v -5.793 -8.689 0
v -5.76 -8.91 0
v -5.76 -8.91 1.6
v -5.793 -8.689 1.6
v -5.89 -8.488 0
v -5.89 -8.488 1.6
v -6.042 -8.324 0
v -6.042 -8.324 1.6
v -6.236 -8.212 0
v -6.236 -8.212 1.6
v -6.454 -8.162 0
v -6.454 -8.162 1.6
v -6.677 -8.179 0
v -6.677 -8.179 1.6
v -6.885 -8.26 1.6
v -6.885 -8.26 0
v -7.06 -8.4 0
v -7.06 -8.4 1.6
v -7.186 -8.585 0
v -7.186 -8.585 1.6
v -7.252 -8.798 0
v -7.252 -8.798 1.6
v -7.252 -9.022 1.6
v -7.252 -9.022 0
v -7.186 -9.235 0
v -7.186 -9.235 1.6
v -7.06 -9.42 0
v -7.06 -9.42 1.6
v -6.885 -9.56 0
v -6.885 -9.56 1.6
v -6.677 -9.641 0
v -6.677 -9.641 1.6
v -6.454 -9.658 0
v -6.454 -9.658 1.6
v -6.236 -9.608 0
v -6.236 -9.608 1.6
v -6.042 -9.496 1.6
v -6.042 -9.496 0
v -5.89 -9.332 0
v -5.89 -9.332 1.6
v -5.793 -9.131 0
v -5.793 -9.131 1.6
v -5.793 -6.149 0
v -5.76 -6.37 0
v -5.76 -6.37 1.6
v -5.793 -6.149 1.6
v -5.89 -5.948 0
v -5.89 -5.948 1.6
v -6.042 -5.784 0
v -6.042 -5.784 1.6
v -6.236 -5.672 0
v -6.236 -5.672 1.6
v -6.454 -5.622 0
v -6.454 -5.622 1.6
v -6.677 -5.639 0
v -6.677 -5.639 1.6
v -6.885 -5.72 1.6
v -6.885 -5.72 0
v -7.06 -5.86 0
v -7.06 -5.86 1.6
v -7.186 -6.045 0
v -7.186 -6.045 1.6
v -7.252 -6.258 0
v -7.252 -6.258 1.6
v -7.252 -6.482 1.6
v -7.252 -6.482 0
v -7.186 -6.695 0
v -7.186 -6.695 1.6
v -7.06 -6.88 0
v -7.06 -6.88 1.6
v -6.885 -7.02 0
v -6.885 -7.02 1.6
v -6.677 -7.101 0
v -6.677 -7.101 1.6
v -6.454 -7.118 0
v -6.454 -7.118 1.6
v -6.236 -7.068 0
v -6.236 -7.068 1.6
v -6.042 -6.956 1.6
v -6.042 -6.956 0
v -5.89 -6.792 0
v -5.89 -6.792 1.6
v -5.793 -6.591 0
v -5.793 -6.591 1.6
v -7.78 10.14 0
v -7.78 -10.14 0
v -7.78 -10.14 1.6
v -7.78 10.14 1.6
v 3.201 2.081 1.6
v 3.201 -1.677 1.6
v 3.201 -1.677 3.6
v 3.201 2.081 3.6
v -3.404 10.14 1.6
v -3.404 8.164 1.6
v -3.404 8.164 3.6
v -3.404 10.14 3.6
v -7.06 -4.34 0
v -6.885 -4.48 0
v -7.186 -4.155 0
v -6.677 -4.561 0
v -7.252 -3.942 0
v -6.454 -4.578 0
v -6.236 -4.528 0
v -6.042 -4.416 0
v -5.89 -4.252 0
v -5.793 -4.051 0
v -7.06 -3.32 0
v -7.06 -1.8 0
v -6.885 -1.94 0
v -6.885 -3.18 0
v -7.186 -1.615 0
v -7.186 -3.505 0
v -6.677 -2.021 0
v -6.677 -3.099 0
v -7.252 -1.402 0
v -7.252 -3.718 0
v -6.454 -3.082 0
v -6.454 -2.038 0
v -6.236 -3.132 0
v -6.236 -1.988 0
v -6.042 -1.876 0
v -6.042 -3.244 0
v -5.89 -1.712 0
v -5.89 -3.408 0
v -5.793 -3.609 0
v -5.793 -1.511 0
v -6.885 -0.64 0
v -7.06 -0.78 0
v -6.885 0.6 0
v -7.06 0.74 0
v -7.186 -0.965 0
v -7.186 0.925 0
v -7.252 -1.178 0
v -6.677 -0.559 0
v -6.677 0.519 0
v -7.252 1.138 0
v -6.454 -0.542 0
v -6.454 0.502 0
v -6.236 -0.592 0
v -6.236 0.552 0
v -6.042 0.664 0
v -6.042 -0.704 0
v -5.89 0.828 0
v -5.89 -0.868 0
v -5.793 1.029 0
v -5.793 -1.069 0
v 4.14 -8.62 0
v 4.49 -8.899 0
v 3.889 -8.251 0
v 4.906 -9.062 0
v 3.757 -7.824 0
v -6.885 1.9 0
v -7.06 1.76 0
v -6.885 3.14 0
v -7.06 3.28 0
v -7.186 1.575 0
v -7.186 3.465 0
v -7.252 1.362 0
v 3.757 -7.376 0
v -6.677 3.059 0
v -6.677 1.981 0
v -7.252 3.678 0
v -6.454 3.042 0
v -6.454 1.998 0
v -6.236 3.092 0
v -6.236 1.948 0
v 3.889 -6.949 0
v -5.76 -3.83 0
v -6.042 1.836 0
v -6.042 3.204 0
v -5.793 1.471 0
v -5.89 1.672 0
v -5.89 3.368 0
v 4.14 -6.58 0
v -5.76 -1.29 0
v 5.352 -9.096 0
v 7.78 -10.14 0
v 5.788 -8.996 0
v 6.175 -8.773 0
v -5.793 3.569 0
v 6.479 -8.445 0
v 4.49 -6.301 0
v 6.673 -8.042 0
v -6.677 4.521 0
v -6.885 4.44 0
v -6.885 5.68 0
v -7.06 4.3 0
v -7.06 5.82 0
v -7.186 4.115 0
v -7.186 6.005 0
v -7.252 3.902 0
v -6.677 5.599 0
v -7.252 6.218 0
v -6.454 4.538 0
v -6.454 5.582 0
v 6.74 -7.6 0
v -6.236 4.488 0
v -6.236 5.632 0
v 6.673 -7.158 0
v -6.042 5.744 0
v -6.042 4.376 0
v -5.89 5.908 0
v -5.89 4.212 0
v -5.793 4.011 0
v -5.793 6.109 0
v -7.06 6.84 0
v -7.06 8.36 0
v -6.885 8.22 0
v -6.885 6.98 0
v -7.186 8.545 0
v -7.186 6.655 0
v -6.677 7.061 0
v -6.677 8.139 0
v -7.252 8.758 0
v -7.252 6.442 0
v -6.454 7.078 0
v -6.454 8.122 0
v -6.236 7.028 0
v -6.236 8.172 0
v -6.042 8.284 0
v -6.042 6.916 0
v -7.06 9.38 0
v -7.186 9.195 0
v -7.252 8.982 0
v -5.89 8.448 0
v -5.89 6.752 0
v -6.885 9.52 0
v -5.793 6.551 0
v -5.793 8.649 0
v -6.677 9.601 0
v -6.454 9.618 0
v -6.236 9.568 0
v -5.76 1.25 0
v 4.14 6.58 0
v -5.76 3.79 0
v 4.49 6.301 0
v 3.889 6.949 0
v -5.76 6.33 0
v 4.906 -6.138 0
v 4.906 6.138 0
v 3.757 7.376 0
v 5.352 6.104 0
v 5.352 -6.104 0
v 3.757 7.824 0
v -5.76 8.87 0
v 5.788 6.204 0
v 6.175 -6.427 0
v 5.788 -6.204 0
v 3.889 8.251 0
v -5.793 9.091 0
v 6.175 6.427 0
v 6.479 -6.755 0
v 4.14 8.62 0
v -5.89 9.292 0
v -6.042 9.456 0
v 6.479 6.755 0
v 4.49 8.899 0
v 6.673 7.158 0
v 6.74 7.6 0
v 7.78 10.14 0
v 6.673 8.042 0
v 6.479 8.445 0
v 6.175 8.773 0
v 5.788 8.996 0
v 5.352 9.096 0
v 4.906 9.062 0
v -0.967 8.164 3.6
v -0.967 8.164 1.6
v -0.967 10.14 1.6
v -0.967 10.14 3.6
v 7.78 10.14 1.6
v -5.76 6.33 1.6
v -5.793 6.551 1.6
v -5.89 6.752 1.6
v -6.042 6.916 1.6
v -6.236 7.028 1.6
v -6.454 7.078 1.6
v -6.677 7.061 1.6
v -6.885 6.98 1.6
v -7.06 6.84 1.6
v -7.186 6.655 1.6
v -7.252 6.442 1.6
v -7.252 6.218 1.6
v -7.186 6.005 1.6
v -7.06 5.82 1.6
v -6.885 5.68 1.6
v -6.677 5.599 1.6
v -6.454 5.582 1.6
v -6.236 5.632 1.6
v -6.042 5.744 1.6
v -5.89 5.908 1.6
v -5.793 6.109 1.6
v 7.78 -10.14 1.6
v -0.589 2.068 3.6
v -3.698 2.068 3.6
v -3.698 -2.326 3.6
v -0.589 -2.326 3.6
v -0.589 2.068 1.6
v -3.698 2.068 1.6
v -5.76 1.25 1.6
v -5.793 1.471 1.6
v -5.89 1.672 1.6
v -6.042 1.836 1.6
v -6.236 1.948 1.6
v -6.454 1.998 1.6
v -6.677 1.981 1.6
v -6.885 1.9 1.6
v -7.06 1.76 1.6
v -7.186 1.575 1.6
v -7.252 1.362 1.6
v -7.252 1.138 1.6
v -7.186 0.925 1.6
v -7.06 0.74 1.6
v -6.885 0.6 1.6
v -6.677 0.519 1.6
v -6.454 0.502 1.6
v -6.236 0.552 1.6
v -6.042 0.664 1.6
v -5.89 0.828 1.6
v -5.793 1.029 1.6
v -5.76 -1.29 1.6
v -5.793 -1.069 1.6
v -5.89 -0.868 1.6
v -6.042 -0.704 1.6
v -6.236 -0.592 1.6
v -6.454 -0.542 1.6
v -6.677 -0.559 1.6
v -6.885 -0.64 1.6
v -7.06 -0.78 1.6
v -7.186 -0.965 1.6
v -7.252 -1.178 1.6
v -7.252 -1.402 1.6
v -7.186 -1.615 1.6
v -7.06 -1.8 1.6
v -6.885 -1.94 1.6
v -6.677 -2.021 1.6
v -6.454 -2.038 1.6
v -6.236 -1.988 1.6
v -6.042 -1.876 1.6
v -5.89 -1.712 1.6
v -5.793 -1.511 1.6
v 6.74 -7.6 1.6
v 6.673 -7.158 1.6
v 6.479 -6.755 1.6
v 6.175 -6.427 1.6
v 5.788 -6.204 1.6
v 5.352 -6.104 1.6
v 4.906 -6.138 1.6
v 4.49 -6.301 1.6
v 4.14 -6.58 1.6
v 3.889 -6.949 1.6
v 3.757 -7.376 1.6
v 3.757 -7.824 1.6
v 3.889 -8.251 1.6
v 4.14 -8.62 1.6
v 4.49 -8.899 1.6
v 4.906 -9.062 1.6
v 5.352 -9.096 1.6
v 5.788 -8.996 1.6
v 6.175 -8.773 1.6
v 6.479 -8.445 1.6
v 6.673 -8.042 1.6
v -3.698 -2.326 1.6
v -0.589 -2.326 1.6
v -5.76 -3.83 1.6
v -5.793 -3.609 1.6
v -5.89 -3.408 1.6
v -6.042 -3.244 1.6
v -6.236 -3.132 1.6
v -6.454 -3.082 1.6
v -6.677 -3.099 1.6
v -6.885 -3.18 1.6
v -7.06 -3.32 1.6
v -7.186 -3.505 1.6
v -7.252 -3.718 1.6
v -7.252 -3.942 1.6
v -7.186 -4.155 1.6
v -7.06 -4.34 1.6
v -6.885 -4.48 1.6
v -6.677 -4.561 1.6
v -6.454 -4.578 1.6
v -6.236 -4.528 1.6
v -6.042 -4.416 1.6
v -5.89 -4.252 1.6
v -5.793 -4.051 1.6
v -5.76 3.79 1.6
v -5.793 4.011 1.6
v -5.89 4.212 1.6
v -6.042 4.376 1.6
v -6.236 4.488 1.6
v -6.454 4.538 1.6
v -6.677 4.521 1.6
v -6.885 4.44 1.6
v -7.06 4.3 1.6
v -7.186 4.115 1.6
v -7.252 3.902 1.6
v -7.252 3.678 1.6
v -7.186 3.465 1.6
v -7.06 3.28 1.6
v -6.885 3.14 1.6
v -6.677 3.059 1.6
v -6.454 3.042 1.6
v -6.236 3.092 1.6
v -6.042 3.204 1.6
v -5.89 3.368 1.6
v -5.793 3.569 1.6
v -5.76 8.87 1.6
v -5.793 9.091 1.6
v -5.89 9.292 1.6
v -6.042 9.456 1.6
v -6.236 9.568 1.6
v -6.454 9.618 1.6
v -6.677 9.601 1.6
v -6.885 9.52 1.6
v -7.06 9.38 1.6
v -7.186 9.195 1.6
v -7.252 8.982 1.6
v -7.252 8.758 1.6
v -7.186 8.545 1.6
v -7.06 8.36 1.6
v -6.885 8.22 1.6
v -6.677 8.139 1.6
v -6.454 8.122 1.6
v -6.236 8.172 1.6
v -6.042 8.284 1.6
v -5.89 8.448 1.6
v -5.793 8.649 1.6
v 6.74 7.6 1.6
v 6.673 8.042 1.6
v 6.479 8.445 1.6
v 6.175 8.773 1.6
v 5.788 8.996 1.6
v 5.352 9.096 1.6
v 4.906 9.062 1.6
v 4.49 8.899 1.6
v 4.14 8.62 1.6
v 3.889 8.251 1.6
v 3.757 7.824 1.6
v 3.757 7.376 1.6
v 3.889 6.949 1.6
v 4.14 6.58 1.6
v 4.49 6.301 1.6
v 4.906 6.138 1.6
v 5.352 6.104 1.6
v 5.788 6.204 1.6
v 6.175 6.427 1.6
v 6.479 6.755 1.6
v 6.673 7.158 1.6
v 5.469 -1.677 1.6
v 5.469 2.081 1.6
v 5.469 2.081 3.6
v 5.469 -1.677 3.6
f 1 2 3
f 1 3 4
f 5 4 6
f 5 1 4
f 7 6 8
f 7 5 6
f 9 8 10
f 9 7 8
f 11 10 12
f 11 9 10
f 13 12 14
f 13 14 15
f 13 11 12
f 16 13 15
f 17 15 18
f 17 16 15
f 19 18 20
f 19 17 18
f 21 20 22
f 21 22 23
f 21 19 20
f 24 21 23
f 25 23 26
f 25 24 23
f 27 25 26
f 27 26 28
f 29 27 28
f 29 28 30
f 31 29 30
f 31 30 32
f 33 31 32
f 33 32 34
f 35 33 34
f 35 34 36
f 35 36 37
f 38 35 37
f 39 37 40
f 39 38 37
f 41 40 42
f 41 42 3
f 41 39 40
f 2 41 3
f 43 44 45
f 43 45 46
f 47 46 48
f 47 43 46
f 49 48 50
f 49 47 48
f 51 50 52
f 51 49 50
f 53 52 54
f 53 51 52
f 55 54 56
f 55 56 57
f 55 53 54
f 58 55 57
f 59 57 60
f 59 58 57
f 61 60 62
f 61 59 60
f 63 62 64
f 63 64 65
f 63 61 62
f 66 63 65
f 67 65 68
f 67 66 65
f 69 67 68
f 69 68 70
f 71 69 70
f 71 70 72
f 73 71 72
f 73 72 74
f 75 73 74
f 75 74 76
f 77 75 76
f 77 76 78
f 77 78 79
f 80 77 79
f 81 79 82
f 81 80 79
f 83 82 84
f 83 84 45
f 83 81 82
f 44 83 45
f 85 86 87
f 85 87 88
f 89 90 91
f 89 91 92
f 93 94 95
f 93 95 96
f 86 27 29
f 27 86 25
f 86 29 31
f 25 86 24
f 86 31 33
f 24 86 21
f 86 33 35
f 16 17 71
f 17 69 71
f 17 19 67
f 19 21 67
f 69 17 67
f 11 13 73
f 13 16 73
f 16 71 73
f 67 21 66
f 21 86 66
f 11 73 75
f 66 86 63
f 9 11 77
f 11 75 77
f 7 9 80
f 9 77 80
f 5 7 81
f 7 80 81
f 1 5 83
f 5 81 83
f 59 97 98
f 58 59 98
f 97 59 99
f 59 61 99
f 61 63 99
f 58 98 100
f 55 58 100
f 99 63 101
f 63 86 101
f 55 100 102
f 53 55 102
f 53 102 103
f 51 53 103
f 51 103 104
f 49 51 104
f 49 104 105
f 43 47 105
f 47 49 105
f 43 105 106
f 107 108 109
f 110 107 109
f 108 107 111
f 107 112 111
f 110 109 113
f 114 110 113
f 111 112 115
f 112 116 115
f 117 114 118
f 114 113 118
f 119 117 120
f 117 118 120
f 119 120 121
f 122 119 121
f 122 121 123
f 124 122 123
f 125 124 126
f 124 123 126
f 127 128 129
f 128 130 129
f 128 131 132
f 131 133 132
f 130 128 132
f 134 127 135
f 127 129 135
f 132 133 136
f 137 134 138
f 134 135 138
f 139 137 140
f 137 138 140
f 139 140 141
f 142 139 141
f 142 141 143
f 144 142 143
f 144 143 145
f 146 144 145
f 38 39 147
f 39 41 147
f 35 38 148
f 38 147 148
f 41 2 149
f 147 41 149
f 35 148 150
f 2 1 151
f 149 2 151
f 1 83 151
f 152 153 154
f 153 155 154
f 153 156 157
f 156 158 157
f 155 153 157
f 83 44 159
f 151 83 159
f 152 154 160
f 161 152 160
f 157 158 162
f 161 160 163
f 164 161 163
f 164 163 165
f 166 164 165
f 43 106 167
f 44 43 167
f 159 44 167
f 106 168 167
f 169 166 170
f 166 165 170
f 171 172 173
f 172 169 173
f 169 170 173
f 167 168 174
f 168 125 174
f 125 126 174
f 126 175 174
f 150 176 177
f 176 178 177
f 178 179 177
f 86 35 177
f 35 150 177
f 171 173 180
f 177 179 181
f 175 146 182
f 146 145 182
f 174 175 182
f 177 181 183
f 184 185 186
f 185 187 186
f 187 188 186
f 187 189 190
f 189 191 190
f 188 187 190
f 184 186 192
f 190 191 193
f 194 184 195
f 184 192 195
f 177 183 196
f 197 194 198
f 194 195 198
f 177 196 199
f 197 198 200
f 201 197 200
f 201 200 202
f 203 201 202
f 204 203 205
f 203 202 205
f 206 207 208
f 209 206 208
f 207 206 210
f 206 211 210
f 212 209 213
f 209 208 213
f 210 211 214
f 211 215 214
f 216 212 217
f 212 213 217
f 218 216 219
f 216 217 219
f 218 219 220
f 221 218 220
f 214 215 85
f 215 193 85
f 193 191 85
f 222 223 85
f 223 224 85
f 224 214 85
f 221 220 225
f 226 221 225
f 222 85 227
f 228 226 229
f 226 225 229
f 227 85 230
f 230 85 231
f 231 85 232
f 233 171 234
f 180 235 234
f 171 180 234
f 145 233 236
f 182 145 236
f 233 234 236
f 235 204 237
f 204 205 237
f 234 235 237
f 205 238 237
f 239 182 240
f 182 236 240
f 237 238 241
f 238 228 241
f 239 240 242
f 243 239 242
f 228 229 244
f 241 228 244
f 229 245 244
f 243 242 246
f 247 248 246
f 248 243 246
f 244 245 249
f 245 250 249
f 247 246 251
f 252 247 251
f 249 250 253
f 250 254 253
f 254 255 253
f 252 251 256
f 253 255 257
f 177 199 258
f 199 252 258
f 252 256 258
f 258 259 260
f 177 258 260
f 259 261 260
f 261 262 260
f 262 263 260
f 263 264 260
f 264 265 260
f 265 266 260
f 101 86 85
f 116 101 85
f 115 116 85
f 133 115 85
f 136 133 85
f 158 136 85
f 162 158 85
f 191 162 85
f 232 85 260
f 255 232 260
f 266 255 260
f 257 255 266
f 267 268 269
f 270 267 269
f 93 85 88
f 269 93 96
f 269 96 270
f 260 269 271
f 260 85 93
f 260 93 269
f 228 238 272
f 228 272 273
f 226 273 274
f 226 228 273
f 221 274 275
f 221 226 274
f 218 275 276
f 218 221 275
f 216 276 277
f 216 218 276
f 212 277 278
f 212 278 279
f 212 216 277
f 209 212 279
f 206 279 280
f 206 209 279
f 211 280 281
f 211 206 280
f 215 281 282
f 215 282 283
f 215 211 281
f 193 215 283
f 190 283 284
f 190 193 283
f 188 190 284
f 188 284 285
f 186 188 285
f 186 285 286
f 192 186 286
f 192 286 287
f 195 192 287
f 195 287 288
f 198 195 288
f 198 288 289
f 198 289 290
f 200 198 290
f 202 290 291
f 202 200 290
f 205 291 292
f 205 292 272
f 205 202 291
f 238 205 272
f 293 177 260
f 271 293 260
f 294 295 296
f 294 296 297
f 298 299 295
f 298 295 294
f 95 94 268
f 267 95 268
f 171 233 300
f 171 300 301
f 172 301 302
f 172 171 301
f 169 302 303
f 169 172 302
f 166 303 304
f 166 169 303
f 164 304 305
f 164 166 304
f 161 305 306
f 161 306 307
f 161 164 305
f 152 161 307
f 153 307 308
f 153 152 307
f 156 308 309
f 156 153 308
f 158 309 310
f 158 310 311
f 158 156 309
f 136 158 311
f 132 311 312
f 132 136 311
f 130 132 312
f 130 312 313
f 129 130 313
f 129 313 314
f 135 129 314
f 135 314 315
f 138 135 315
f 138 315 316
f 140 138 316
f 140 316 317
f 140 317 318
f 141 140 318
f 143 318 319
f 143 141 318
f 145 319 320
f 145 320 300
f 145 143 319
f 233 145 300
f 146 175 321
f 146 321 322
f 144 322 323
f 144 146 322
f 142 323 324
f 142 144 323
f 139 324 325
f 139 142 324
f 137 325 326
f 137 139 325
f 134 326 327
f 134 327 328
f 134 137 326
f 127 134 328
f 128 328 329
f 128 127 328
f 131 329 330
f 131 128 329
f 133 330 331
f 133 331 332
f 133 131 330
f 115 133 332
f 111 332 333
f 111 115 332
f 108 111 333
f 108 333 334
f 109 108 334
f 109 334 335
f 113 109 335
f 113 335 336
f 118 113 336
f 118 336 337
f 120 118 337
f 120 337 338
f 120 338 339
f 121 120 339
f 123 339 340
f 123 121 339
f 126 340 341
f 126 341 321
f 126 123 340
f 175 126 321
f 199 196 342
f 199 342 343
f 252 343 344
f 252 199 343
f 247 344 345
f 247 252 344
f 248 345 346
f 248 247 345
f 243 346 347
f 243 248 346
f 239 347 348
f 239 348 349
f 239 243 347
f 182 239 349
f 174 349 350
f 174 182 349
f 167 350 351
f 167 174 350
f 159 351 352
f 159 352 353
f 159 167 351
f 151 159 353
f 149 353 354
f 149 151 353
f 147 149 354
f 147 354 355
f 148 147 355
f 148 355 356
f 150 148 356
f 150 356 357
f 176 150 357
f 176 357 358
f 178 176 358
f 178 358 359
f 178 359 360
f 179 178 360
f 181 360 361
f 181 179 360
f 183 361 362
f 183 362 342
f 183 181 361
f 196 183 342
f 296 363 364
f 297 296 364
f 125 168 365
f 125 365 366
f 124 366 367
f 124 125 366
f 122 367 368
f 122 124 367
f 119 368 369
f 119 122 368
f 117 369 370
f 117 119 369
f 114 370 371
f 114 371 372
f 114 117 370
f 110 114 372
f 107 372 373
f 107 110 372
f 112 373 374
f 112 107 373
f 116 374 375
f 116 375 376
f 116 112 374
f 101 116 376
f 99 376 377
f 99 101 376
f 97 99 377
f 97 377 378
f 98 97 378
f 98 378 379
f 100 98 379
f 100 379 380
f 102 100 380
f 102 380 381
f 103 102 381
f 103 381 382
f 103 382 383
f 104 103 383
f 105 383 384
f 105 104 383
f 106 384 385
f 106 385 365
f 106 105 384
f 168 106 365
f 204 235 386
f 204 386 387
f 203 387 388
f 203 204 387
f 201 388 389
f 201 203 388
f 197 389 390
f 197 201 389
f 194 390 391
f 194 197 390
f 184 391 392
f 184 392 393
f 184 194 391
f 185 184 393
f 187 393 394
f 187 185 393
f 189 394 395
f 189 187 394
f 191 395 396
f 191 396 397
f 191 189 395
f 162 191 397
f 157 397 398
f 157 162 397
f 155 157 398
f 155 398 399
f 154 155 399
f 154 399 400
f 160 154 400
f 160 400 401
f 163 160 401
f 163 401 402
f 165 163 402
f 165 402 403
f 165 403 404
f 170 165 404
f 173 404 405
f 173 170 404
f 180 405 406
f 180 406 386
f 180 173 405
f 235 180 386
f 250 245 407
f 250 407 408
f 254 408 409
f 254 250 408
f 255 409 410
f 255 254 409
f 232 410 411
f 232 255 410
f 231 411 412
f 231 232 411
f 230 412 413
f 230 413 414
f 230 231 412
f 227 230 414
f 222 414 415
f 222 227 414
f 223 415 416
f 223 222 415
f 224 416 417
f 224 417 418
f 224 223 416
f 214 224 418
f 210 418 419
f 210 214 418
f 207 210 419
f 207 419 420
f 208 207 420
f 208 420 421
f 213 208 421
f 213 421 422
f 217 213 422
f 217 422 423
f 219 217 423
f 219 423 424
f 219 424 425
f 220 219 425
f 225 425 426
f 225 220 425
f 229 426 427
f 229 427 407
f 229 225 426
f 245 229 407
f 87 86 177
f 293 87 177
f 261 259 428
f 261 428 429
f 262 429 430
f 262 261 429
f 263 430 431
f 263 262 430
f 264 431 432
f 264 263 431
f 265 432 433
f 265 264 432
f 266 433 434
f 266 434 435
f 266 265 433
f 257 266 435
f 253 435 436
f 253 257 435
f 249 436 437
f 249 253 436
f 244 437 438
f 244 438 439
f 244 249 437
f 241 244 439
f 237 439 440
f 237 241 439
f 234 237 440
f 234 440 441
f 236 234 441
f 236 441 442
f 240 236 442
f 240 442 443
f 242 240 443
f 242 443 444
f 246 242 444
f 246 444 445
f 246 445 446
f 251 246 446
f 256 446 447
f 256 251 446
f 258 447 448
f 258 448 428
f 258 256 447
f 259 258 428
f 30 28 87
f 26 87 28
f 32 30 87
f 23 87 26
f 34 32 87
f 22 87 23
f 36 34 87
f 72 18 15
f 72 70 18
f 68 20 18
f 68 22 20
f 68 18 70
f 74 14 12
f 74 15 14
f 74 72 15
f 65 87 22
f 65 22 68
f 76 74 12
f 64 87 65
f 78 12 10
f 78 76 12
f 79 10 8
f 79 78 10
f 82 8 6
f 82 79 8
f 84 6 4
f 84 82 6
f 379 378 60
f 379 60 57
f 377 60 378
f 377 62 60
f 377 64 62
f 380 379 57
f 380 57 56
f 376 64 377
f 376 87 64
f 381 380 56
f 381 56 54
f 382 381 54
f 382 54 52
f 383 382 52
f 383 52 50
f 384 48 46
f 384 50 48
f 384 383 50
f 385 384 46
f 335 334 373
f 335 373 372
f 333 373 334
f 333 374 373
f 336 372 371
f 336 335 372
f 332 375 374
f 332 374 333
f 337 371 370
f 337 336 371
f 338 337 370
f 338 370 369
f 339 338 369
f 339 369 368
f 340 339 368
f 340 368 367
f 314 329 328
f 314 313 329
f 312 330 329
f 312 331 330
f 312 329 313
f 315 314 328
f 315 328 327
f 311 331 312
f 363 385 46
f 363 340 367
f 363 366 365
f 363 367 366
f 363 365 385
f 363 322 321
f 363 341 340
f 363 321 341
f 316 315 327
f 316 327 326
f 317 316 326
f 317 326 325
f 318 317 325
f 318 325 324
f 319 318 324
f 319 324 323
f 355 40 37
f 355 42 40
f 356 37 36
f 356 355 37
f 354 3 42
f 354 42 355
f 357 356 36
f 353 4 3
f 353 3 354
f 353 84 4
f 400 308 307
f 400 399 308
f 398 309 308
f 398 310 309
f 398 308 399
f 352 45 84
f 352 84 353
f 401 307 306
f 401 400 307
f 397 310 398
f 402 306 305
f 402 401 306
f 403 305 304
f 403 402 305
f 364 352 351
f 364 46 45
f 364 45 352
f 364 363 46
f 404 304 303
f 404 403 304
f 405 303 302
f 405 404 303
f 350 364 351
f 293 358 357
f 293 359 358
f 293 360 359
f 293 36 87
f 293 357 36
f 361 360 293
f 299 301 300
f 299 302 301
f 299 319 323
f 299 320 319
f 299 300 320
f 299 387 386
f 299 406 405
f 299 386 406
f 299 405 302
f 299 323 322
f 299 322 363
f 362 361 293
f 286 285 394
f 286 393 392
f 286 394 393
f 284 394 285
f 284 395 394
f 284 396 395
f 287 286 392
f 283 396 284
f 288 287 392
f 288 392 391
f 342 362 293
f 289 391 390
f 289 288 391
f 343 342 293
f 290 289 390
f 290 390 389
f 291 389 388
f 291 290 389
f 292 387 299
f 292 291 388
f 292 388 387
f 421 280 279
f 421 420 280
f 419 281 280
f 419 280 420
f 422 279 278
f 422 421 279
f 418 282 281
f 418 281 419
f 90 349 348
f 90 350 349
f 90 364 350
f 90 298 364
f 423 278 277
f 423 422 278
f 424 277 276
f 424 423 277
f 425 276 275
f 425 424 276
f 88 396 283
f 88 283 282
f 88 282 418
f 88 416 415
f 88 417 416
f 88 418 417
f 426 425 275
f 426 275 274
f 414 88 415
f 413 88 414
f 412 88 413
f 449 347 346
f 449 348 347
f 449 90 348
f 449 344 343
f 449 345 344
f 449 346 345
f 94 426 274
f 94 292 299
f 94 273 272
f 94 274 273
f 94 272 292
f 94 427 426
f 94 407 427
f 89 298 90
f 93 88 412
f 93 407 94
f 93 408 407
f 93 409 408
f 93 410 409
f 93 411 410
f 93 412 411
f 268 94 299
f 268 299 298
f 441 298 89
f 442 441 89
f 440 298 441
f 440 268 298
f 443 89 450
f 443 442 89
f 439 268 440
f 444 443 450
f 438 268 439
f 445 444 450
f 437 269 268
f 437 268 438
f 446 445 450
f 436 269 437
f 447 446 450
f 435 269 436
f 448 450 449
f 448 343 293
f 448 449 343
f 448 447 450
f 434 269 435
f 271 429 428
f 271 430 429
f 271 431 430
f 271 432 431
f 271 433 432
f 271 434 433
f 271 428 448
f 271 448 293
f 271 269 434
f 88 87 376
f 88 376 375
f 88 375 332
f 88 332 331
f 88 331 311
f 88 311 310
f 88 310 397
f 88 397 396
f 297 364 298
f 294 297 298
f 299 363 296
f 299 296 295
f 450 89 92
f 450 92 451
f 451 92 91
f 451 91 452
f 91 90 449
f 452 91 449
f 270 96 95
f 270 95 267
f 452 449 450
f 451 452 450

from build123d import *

# Parameters (mm, degrees)
SKETCH_1_W      = 15.56
SKETCH_1_H      = 20.28
SKETCH_1_R      = 1.5
SKETCH_1_R_2    = 0.75
EXTRUDE_1_DEPTH = 1.6
SKETCH_2_W      = 2.267131812
SKETCH_2_H      = 3.757883692
SKETCH_2_W_2    = 3.109101674
SKETCH_2_H_2    = 4.394457387
SKETCH_2_W_3    = 2.437826046
SKETCH_2_H_3    = 1.976096162
EXTRUDE_2_DEPTH = 2


with BuildPart() as part:
    # 草图1 → 凸台-拉伸1 (new body)
    with BuildSketch(Plane.XY):
        Rectangle(SKETCH_1_W, SKETCH_1_H)
        with Locations((5.24, 7.6)):
            Circle(SKETCH_1_R, mode=Mode.SUBTRACT)
        with Locations((5.24, -7.6)):
            Circle(SKETCH_1_R, mode=Mode.SUBTRACT)
        with Locations((-6.51, 8.87)):
            Circle(SKETCH_1_R_2, mode=Mode.SUBTRACT)
        with Locations((-6.51, 6.33)):
            Circle(SKETCH_1_R_2, mode=Mode.SUBTRACT)
        with Locations((-6.51, 3.79)):
            Circle(SKETCH_1_R_2, mode=Mode.SUBTRACT)
        with Locations((-6.51, 1.25)):
            Circle(SKETCH_1_R_2, mode=Mode.SUBTRACT)
        with Locations((-6.51, -1.29)):
            Circle(SKETCH_1_R_2, mode=Mode.SUBTRACT)
        with Locations((-6.51, -3.83)):
            Circle(SKETCH_1_R_2, mode=Mode.SUBTRACT)
        with Locations((-6.51, -6.37)):
            Circle(SKETCH_1_R_2, mode=Mode.SUBTRACT)
        with Locations((-6.51, -8.91)):
            Circle(SKETCH_1_R_2, mode=Mode.SUBTRACT)
    extrude(amount=EXTRUDE_1_DEPTH)

    # 草图2 → 凸台-拉伸2 (add)
    with BuildSketch(Plane.XY.offset(1.6)):
        with Locations((4.335037476, 0.202355131)):
            Rectangle(SKETCH_2_W, SKETCH_2_H)
        with Locations((-2.143513608, -0.128846081)):
            Rectangle(SKETCH_2_W_2, SKETCH_2_H_2)
        with Locations((-2.18551331, 9.151951919)):
            Rectangle(SKETCH_2_W_3, SKETCH_2_H_3)
    extrude(amount=EXTRUDE_2_DEPTH)


solid = part.part
